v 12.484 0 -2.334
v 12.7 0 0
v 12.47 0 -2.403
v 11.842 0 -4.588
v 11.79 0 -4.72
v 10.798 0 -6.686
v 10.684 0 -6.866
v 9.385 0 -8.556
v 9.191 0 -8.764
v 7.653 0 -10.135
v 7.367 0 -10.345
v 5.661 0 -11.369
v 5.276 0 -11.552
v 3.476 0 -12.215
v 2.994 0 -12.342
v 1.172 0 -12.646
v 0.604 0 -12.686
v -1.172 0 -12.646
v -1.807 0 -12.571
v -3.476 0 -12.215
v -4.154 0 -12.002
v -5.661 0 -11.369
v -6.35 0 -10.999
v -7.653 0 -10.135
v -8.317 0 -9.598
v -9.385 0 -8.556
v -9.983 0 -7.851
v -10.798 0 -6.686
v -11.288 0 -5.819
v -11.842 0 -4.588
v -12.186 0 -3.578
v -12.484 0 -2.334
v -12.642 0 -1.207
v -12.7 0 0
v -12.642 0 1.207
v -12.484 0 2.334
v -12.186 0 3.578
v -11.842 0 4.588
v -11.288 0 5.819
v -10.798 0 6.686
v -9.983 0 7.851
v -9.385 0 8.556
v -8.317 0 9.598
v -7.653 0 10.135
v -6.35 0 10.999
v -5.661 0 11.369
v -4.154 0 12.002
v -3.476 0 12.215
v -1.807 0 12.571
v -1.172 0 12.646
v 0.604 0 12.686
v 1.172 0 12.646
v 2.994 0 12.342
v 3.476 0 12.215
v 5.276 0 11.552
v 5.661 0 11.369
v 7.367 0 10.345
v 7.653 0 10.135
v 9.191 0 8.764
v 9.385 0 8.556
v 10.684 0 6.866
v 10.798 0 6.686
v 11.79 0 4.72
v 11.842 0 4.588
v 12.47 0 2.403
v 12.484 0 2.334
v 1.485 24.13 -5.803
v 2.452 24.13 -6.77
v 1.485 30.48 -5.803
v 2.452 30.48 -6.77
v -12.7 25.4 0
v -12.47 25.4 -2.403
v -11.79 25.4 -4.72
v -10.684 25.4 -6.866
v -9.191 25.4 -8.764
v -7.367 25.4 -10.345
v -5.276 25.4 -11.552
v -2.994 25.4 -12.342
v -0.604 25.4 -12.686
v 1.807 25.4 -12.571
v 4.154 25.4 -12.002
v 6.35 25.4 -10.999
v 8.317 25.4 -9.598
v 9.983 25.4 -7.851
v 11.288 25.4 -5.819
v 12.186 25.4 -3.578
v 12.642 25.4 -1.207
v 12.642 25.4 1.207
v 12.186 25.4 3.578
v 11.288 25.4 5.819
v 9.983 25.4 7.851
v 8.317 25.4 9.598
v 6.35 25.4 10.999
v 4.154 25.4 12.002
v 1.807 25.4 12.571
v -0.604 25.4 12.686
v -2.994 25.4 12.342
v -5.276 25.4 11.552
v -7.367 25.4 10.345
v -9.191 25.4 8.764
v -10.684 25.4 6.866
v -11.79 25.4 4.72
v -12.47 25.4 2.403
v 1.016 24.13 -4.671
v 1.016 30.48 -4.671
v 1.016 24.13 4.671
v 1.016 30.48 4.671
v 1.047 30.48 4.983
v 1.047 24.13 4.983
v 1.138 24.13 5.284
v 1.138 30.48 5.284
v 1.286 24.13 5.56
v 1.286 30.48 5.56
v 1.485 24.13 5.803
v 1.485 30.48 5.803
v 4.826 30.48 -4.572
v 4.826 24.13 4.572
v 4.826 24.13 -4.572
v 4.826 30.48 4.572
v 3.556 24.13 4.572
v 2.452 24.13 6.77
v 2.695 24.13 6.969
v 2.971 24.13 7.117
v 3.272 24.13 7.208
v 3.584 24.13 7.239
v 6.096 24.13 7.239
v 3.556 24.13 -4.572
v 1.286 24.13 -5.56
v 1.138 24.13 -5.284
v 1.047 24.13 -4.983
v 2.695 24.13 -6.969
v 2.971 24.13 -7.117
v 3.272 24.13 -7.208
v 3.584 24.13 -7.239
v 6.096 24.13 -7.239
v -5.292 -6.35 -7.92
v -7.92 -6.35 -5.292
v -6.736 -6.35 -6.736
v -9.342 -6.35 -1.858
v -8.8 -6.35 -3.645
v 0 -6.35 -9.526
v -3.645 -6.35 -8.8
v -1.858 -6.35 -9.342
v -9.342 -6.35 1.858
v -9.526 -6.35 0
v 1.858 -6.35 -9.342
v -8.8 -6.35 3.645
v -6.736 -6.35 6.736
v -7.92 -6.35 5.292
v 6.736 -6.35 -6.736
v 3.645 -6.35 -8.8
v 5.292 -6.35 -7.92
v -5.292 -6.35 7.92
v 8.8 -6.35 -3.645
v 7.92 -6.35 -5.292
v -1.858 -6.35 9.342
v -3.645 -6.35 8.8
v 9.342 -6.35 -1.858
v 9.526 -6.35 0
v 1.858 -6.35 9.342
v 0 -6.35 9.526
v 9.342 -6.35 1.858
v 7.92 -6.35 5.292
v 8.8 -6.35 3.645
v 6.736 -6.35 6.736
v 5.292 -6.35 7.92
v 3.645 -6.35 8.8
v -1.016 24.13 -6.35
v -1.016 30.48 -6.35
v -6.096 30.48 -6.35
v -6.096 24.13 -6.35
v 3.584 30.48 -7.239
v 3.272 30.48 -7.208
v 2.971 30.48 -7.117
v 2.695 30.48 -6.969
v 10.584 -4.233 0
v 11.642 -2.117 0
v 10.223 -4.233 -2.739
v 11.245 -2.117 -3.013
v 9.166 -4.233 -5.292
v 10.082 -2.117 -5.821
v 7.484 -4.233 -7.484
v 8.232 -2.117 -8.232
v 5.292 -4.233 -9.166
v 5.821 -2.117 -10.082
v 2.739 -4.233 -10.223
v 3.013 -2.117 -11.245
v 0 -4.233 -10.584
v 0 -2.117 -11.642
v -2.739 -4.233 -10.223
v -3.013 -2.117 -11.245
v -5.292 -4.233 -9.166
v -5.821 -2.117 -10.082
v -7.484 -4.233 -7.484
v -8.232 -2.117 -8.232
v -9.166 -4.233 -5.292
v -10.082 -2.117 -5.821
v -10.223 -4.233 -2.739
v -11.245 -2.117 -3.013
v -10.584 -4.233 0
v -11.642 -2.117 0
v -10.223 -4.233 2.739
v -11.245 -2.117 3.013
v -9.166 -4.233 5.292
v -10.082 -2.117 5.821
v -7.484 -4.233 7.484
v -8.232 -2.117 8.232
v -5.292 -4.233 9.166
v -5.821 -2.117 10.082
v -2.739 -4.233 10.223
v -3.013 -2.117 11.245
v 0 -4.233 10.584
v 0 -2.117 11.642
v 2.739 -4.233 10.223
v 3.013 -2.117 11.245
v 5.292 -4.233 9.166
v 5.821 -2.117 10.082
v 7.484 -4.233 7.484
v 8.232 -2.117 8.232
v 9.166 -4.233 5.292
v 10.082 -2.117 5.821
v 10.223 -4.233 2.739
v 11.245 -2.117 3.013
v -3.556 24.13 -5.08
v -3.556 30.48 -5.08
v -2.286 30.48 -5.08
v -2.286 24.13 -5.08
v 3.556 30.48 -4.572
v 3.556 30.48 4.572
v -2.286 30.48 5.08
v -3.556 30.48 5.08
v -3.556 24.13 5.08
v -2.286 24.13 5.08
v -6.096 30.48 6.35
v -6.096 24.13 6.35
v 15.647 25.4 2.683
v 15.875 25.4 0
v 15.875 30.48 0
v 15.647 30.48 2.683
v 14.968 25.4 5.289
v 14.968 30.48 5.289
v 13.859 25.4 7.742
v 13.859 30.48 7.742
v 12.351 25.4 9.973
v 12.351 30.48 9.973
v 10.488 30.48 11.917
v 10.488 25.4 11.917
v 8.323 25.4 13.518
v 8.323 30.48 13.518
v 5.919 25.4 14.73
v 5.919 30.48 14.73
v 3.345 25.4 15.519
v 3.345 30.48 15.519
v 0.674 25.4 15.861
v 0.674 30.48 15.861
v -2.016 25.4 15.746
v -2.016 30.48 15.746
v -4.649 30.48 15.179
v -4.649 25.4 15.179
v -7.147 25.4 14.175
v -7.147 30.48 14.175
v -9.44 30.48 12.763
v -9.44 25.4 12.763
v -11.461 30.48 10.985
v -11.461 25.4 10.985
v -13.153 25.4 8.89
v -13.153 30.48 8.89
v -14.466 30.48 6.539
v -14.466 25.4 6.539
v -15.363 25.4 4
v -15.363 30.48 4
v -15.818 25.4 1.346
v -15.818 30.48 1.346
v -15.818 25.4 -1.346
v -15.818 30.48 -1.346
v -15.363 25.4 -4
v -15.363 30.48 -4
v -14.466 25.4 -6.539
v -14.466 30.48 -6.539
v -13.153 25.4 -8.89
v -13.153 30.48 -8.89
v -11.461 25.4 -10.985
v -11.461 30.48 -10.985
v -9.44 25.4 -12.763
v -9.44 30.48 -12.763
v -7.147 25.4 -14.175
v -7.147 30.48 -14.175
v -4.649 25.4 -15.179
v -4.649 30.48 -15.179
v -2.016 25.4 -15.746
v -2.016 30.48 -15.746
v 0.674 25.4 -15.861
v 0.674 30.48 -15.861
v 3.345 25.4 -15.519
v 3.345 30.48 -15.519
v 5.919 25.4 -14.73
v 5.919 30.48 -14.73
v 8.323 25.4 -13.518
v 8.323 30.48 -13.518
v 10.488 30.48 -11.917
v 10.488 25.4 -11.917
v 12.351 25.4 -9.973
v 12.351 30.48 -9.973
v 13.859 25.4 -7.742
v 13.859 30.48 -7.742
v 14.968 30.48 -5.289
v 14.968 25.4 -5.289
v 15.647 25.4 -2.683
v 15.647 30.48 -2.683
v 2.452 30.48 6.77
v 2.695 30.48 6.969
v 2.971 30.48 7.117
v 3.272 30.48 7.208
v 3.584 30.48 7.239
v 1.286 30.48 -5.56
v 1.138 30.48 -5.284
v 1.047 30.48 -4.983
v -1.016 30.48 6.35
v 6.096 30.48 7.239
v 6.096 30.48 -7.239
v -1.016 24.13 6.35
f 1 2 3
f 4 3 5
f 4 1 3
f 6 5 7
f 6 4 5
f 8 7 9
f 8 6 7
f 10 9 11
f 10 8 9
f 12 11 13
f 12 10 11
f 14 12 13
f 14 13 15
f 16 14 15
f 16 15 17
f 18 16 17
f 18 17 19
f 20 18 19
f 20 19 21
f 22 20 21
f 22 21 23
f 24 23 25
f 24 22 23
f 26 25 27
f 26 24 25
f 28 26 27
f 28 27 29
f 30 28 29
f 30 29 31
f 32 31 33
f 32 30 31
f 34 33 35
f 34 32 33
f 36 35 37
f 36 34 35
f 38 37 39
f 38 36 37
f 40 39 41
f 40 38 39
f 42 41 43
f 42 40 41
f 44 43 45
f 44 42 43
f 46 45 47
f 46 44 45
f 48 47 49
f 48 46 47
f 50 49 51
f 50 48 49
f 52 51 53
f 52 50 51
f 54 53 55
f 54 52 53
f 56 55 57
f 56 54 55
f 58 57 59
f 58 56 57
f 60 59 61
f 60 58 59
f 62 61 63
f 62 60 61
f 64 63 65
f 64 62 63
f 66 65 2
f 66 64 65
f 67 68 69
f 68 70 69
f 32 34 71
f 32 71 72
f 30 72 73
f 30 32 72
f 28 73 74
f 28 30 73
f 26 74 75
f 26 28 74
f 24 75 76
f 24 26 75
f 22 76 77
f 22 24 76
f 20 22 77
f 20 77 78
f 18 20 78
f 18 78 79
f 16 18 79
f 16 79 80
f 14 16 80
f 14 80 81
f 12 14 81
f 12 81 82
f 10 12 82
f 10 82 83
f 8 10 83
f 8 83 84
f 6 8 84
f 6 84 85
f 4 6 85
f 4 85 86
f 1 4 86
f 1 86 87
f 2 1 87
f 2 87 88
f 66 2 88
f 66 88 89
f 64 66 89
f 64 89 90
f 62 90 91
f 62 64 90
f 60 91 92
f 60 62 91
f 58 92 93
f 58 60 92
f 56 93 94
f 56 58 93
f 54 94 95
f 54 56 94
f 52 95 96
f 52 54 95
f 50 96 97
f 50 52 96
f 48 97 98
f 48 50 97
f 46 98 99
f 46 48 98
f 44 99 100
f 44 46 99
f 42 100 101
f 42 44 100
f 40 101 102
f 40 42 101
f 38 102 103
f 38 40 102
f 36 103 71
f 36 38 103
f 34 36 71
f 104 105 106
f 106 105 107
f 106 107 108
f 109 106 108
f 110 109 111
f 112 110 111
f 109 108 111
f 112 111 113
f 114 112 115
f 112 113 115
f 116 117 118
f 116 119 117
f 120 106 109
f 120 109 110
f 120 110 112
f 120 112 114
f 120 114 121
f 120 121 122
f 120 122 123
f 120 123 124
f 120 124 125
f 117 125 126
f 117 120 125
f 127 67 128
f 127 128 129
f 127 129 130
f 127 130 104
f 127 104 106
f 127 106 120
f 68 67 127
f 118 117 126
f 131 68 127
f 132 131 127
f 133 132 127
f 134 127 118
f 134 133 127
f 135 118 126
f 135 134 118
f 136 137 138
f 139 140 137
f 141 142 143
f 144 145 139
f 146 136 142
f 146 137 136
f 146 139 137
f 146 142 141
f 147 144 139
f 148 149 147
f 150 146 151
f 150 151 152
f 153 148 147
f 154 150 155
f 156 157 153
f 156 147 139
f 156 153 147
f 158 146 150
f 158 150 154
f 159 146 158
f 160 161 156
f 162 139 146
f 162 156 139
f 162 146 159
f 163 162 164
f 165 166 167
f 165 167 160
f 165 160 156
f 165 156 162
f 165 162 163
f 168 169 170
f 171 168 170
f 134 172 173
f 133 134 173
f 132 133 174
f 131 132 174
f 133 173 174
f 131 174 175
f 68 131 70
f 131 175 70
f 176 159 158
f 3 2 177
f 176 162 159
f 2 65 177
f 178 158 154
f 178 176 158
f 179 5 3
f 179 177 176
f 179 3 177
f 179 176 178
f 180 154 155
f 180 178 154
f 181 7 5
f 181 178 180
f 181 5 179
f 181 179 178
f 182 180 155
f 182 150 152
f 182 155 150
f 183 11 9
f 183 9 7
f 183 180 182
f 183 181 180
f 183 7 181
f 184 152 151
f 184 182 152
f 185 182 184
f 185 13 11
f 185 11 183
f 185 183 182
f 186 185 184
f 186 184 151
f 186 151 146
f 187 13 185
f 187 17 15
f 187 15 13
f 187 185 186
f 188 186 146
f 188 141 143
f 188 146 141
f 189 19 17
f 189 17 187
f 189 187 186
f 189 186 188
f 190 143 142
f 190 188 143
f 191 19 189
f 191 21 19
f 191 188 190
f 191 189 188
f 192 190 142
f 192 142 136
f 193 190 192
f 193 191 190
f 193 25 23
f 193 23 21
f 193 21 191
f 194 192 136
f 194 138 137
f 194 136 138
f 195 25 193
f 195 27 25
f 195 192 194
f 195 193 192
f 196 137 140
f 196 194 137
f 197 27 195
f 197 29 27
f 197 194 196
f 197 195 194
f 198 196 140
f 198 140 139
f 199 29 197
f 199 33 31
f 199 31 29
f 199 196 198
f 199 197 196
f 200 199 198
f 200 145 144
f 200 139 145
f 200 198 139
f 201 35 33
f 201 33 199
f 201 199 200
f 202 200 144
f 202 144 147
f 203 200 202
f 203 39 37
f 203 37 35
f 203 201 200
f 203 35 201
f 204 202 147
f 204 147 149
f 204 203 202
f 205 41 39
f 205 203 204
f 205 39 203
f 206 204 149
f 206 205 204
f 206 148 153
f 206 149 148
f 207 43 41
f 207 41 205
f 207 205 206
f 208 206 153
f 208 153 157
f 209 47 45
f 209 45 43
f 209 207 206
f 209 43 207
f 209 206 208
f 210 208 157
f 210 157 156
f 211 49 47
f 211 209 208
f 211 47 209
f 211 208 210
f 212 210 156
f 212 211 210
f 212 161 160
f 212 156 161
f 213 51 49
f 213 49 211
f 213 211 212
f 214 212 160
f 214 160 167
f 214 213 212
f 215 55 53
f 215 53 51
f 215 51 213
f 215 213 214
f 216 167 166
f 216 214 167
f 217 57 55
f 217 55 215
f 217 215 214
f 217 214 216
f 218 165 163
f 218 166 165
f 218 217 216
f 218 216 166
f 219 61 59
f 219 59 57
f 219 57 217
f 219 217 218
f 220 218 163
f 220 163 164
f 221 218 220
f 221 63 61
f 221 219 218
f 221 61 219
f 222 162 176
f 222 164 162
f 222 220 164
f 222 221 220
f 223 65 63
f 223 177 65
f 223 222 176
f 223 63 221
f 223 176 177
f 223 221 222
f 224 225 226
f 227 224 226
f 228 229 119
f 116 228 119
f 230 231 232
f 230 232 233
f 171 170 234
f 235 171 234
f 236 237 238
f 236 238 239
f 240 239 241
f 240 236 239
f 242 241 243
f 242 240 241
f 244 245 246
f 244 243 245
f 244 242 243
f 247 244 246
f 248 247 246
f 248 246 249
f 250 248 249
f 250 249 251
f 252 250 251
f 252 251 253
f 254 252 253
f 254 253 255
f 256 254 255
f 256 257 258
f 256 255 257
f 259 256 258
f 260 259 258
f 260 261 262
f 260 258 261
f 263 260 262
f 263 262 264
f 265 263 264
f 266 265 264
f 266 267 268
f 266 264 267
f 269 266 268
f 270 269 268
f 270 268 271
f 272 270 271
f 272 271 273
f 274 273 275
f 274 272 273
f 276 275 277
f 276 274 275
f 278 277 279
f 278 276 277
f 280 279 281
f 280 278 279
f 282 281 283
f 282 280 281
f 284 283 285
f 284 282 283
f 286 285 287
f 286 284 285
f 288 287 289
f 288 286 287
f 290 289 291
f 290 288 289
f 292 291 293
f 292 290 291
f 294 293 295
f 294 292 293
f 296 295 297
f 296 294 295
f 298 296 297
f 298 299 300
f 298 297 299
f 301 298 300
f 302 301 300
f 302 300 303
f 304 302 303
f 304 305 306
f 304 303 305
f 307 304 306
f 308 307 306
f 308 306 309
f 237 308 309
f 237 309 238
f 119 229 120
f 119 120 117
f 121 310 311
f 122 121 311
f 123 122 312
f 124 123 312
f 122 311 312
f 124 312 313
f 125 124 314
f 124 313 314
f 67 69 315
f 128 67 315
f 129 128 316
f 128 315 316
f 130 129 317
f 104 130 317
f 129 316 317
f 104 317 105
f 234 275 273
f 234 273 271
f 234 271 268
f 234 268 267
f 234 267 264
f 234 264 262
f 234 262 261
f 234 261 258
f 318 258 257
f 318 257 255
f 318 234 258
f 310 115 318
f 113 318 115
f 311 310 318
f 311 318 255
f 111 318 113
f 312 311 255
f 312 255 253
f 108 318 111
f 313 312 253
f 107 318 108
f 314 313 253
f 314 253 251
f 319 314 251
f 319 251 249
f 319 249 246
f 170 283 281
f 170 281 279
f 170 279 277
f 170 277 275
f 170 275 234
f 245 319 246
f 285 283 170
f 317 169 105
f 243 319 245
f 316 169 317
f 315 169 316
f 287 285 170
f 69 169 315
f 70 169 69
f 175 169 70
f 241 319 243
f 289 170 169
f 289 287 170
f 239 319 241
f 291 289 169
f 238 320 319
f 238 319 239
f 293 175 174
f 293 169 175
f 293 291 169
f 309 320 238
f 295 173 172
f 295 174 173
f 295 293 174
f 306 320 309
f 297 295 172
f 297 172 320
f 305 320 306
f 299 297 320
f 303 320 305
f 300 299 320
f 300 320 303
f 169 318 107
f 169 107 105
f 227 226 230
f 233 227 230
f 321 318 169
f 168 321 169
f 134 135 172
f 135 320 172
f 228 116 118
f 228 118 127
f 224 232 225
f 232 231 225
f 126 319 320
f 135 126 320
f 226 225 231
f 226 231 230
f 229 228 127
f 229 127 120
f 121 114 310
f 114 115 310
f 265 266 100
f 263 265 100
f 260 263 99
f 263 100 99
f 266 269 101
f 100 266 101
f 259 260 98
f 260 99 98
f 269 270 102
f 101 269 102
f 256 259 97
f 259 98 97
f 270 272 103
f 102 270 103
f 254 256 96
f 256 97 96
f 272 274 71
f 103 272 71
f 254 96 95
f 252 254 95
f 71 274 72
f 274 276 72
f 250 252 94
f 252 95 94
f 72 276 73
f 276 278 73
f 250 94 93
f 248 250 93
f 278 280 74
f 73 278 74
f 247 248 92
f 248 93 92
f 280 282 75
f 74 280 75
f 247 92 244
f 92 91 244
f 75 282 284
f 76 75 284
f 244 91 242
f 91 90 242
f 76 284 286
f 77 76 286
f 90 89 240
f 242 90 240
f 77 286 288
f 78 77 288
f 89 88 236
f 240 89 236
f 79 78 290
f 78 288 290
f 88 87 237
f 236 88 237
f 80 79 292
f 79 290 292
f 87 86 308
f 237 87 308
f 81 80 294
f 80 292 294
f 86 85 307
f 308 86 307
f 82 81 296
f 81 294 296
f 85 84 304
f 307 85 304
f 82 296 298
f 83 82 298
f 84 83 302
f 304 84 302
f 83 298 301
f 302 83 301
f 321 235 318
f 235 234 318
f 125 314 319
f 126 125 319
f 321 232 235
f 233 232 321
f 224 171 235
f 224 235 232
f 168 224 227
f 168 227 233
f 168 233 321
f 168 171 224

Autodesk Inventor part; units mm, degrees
ref_plane "YZ Plane" through (0, 0, 0) normal (1, 0, 0) x (0, 1, 0)
ref_plane "XZ Plane" through (0, 0, 0) normal (0, 1, 0) x (-1, 0, 0)
ref_plane "XY Plane" through (0, 0, 0) normal (0, 0, 1) x (1, 0, 0)
sketch "Sketch1" plane through (0, 0, 0) normal (0, 1, 0) x (-1, 0, 0)
  circle A0 centre (0, 0) radius 12.7
  dimension "d0" = 25.4
extrude "Extrusion1" add sketch "Sketch1" along normal blind 25.4
sketch "Sketch2" plane through (0, 25.4, 0) normal (0, 1, 0) x (1, 0, 0)
  circle A0 centre (0, 0) radius 15.875
  dimension "d3" = 31.75
extrude "Extrusion2" add sketch "Sketch2" along normal blind 5.08
sketch "Sketch3" plane through (0, 0, 0) normal (0, -1, 0) x (1, 0, 0)
  circle A0 centre (0, 0) radius 12.7 projected
extrude "Extrusion3" add sketch "Sketch3" along normal blind 6.35
chamfer "Chamfer1" distance 3.175 distance2 6.35 1 edges at (-12.7, -6.35, 0) measured on face at (0.3934, -6.35, -3.2397)
sketch "Sketch4" plane through (0, 30.48, 0) normal (0, 1, 0) x (1, 0, 0)
  line L0 (0, 0) -> (1.016, 0) construction
  line L1 (0, 0) -> (-1.016, 0) construction
  line L2 (-1.016, 0) -> (-3.556, 0) construction
  line L3 (-3.556, 0) -> (-3.556, 6.35) construction
  line L4 (-3.556, 6.35) -> (-1.016, 6.35) construction
  line L5 (-1.016, 6.35) -> (-1.016, 0) construction
  line L6 (-1.016, 6.35) -> (-6.096, 6.35)
  line L7 (-6.096, 6.35) -> (-6.096, -6.35)
  line L8 (-6.096, -6.35) -> (-1.016, -6.35)
  line L9 (-1.016, -6.35) -> (-1.016, 6.35)
  line L10 (1.016, 0) -> (1.016, 7.239) construction
  line L11 (1.016, 0) -> (6.096, 0) construction
  line L12 (3.556, 0) -> (3.556, 4.572) construction
  line L13 (3.556, 0) -> (3.556, -4.572) construction
  line L14 (3.556, 4.572) -> (4.826, 4.572) construction
  line L15 (3.556, -4.572) -> (2.286, -4.572) construction
  line L16 (4.826, 4.572) -> (3.556, 4.572)
  line L17 (3.556, 4.572) -> (3.556, -4.572)
  line L18 (3.556, -4.572) -> (4.826, -4.572)
  line L19 (4.826, -4.572) -> (4.826, 4.572)
  line L20 (1.016, 7.239) -> (6.096, 7.239) construction
  line L21 (6.096, 7.239) -> (3.5838, 7.239)
  line L22 (1.016, 4.6712) -> (1.016, -4.6712)
  line L23 (3.5838, -7.239) -> (6.096, -7.239)
  line L24 (6.096, -7.239) -> (6.096, 7.239)
  line L25 (-2.286, 0) -> (-3.556, 0)
  line L26 (-3.556, 0) -> (-3.556, 5.08)
  line L27 (-3.556, 5.08) -> (-2.286, 5.08)
  line L28 (-2.286, 5.08) -> (-2.286, 0)
  line L29 (-2.286, 0) -> (-3.556, 0)
  line L30 (-3.556, 0) -> (-3.556, -5.08)
  line L31 (-3.556, -5.08) -> (-2.286, -5.08)
  line L32 (-2.286, -5.08) -> (-2.286, 0)
  line L33 (1.016, 7.239) -> (1.016, 5.334) construction
  line L34 (1.016, -7.239) -> (1.016, -5.334) construction
  line L35 (1.016, -7.239) -> (2.921, -7.239) construction
  line L36 (1.016, 7.239) -> (2.921, 7.239) construction
  line L37 (2.4523, 6.7703) -> (1.4847, 5.8027)
  line L38 (1.4847, -5.8027) -> (2.4523, -6.7703)
  arc A0 (3.5838, 7.239) -> (2.4523, 6.7703) centre (3.5838, 5.6388) ccw
  arc A1 (1.4847, 5.8027) -> (1.016, 4.6712) centre (2.6162, 4.6712) ccw
  arc A2 (1.016, -4.6712) -> (1.4847, -5.8027) centre (2.6162, -4.6712) ccw
  arc A3 (2.4523, -6.7703) -> (3.5838, -7.239) centre (3.5838, -5.6388) ccw
  dimension "d11" = 1.016
  dimension "d12" = 1.016
  dimension "d13" = 2.54
  dimension "d14" = 6.35
  dimension "d15" = 5.08
  dimension "d16" = 12.7
  dimension "d17" = 7.239
  dimension "d18" = 5.08
  dimension "d19" = 4.572
  dimension "d20" = 4.572
  dimension "d21" = 1.27
  dimension "d22" = 1.27
  dimension "d23" = 5.08
  dimension "d24" = 14.478
  dimension "d25" = 5.08
  dimension "d26" = 5.08
  dimension "d27" = 1.905
  dimension "d28" = 1.905
  dimension "d29" = 1.905
  dimension "d30" = 1.905
  dimension "d31" = 1.6002
extrude "Extrusion4" cut sketch "Sketch4" against normal blind 6.35
properties part number "usbHdmiPanelMount" material "ABS Plastic"
